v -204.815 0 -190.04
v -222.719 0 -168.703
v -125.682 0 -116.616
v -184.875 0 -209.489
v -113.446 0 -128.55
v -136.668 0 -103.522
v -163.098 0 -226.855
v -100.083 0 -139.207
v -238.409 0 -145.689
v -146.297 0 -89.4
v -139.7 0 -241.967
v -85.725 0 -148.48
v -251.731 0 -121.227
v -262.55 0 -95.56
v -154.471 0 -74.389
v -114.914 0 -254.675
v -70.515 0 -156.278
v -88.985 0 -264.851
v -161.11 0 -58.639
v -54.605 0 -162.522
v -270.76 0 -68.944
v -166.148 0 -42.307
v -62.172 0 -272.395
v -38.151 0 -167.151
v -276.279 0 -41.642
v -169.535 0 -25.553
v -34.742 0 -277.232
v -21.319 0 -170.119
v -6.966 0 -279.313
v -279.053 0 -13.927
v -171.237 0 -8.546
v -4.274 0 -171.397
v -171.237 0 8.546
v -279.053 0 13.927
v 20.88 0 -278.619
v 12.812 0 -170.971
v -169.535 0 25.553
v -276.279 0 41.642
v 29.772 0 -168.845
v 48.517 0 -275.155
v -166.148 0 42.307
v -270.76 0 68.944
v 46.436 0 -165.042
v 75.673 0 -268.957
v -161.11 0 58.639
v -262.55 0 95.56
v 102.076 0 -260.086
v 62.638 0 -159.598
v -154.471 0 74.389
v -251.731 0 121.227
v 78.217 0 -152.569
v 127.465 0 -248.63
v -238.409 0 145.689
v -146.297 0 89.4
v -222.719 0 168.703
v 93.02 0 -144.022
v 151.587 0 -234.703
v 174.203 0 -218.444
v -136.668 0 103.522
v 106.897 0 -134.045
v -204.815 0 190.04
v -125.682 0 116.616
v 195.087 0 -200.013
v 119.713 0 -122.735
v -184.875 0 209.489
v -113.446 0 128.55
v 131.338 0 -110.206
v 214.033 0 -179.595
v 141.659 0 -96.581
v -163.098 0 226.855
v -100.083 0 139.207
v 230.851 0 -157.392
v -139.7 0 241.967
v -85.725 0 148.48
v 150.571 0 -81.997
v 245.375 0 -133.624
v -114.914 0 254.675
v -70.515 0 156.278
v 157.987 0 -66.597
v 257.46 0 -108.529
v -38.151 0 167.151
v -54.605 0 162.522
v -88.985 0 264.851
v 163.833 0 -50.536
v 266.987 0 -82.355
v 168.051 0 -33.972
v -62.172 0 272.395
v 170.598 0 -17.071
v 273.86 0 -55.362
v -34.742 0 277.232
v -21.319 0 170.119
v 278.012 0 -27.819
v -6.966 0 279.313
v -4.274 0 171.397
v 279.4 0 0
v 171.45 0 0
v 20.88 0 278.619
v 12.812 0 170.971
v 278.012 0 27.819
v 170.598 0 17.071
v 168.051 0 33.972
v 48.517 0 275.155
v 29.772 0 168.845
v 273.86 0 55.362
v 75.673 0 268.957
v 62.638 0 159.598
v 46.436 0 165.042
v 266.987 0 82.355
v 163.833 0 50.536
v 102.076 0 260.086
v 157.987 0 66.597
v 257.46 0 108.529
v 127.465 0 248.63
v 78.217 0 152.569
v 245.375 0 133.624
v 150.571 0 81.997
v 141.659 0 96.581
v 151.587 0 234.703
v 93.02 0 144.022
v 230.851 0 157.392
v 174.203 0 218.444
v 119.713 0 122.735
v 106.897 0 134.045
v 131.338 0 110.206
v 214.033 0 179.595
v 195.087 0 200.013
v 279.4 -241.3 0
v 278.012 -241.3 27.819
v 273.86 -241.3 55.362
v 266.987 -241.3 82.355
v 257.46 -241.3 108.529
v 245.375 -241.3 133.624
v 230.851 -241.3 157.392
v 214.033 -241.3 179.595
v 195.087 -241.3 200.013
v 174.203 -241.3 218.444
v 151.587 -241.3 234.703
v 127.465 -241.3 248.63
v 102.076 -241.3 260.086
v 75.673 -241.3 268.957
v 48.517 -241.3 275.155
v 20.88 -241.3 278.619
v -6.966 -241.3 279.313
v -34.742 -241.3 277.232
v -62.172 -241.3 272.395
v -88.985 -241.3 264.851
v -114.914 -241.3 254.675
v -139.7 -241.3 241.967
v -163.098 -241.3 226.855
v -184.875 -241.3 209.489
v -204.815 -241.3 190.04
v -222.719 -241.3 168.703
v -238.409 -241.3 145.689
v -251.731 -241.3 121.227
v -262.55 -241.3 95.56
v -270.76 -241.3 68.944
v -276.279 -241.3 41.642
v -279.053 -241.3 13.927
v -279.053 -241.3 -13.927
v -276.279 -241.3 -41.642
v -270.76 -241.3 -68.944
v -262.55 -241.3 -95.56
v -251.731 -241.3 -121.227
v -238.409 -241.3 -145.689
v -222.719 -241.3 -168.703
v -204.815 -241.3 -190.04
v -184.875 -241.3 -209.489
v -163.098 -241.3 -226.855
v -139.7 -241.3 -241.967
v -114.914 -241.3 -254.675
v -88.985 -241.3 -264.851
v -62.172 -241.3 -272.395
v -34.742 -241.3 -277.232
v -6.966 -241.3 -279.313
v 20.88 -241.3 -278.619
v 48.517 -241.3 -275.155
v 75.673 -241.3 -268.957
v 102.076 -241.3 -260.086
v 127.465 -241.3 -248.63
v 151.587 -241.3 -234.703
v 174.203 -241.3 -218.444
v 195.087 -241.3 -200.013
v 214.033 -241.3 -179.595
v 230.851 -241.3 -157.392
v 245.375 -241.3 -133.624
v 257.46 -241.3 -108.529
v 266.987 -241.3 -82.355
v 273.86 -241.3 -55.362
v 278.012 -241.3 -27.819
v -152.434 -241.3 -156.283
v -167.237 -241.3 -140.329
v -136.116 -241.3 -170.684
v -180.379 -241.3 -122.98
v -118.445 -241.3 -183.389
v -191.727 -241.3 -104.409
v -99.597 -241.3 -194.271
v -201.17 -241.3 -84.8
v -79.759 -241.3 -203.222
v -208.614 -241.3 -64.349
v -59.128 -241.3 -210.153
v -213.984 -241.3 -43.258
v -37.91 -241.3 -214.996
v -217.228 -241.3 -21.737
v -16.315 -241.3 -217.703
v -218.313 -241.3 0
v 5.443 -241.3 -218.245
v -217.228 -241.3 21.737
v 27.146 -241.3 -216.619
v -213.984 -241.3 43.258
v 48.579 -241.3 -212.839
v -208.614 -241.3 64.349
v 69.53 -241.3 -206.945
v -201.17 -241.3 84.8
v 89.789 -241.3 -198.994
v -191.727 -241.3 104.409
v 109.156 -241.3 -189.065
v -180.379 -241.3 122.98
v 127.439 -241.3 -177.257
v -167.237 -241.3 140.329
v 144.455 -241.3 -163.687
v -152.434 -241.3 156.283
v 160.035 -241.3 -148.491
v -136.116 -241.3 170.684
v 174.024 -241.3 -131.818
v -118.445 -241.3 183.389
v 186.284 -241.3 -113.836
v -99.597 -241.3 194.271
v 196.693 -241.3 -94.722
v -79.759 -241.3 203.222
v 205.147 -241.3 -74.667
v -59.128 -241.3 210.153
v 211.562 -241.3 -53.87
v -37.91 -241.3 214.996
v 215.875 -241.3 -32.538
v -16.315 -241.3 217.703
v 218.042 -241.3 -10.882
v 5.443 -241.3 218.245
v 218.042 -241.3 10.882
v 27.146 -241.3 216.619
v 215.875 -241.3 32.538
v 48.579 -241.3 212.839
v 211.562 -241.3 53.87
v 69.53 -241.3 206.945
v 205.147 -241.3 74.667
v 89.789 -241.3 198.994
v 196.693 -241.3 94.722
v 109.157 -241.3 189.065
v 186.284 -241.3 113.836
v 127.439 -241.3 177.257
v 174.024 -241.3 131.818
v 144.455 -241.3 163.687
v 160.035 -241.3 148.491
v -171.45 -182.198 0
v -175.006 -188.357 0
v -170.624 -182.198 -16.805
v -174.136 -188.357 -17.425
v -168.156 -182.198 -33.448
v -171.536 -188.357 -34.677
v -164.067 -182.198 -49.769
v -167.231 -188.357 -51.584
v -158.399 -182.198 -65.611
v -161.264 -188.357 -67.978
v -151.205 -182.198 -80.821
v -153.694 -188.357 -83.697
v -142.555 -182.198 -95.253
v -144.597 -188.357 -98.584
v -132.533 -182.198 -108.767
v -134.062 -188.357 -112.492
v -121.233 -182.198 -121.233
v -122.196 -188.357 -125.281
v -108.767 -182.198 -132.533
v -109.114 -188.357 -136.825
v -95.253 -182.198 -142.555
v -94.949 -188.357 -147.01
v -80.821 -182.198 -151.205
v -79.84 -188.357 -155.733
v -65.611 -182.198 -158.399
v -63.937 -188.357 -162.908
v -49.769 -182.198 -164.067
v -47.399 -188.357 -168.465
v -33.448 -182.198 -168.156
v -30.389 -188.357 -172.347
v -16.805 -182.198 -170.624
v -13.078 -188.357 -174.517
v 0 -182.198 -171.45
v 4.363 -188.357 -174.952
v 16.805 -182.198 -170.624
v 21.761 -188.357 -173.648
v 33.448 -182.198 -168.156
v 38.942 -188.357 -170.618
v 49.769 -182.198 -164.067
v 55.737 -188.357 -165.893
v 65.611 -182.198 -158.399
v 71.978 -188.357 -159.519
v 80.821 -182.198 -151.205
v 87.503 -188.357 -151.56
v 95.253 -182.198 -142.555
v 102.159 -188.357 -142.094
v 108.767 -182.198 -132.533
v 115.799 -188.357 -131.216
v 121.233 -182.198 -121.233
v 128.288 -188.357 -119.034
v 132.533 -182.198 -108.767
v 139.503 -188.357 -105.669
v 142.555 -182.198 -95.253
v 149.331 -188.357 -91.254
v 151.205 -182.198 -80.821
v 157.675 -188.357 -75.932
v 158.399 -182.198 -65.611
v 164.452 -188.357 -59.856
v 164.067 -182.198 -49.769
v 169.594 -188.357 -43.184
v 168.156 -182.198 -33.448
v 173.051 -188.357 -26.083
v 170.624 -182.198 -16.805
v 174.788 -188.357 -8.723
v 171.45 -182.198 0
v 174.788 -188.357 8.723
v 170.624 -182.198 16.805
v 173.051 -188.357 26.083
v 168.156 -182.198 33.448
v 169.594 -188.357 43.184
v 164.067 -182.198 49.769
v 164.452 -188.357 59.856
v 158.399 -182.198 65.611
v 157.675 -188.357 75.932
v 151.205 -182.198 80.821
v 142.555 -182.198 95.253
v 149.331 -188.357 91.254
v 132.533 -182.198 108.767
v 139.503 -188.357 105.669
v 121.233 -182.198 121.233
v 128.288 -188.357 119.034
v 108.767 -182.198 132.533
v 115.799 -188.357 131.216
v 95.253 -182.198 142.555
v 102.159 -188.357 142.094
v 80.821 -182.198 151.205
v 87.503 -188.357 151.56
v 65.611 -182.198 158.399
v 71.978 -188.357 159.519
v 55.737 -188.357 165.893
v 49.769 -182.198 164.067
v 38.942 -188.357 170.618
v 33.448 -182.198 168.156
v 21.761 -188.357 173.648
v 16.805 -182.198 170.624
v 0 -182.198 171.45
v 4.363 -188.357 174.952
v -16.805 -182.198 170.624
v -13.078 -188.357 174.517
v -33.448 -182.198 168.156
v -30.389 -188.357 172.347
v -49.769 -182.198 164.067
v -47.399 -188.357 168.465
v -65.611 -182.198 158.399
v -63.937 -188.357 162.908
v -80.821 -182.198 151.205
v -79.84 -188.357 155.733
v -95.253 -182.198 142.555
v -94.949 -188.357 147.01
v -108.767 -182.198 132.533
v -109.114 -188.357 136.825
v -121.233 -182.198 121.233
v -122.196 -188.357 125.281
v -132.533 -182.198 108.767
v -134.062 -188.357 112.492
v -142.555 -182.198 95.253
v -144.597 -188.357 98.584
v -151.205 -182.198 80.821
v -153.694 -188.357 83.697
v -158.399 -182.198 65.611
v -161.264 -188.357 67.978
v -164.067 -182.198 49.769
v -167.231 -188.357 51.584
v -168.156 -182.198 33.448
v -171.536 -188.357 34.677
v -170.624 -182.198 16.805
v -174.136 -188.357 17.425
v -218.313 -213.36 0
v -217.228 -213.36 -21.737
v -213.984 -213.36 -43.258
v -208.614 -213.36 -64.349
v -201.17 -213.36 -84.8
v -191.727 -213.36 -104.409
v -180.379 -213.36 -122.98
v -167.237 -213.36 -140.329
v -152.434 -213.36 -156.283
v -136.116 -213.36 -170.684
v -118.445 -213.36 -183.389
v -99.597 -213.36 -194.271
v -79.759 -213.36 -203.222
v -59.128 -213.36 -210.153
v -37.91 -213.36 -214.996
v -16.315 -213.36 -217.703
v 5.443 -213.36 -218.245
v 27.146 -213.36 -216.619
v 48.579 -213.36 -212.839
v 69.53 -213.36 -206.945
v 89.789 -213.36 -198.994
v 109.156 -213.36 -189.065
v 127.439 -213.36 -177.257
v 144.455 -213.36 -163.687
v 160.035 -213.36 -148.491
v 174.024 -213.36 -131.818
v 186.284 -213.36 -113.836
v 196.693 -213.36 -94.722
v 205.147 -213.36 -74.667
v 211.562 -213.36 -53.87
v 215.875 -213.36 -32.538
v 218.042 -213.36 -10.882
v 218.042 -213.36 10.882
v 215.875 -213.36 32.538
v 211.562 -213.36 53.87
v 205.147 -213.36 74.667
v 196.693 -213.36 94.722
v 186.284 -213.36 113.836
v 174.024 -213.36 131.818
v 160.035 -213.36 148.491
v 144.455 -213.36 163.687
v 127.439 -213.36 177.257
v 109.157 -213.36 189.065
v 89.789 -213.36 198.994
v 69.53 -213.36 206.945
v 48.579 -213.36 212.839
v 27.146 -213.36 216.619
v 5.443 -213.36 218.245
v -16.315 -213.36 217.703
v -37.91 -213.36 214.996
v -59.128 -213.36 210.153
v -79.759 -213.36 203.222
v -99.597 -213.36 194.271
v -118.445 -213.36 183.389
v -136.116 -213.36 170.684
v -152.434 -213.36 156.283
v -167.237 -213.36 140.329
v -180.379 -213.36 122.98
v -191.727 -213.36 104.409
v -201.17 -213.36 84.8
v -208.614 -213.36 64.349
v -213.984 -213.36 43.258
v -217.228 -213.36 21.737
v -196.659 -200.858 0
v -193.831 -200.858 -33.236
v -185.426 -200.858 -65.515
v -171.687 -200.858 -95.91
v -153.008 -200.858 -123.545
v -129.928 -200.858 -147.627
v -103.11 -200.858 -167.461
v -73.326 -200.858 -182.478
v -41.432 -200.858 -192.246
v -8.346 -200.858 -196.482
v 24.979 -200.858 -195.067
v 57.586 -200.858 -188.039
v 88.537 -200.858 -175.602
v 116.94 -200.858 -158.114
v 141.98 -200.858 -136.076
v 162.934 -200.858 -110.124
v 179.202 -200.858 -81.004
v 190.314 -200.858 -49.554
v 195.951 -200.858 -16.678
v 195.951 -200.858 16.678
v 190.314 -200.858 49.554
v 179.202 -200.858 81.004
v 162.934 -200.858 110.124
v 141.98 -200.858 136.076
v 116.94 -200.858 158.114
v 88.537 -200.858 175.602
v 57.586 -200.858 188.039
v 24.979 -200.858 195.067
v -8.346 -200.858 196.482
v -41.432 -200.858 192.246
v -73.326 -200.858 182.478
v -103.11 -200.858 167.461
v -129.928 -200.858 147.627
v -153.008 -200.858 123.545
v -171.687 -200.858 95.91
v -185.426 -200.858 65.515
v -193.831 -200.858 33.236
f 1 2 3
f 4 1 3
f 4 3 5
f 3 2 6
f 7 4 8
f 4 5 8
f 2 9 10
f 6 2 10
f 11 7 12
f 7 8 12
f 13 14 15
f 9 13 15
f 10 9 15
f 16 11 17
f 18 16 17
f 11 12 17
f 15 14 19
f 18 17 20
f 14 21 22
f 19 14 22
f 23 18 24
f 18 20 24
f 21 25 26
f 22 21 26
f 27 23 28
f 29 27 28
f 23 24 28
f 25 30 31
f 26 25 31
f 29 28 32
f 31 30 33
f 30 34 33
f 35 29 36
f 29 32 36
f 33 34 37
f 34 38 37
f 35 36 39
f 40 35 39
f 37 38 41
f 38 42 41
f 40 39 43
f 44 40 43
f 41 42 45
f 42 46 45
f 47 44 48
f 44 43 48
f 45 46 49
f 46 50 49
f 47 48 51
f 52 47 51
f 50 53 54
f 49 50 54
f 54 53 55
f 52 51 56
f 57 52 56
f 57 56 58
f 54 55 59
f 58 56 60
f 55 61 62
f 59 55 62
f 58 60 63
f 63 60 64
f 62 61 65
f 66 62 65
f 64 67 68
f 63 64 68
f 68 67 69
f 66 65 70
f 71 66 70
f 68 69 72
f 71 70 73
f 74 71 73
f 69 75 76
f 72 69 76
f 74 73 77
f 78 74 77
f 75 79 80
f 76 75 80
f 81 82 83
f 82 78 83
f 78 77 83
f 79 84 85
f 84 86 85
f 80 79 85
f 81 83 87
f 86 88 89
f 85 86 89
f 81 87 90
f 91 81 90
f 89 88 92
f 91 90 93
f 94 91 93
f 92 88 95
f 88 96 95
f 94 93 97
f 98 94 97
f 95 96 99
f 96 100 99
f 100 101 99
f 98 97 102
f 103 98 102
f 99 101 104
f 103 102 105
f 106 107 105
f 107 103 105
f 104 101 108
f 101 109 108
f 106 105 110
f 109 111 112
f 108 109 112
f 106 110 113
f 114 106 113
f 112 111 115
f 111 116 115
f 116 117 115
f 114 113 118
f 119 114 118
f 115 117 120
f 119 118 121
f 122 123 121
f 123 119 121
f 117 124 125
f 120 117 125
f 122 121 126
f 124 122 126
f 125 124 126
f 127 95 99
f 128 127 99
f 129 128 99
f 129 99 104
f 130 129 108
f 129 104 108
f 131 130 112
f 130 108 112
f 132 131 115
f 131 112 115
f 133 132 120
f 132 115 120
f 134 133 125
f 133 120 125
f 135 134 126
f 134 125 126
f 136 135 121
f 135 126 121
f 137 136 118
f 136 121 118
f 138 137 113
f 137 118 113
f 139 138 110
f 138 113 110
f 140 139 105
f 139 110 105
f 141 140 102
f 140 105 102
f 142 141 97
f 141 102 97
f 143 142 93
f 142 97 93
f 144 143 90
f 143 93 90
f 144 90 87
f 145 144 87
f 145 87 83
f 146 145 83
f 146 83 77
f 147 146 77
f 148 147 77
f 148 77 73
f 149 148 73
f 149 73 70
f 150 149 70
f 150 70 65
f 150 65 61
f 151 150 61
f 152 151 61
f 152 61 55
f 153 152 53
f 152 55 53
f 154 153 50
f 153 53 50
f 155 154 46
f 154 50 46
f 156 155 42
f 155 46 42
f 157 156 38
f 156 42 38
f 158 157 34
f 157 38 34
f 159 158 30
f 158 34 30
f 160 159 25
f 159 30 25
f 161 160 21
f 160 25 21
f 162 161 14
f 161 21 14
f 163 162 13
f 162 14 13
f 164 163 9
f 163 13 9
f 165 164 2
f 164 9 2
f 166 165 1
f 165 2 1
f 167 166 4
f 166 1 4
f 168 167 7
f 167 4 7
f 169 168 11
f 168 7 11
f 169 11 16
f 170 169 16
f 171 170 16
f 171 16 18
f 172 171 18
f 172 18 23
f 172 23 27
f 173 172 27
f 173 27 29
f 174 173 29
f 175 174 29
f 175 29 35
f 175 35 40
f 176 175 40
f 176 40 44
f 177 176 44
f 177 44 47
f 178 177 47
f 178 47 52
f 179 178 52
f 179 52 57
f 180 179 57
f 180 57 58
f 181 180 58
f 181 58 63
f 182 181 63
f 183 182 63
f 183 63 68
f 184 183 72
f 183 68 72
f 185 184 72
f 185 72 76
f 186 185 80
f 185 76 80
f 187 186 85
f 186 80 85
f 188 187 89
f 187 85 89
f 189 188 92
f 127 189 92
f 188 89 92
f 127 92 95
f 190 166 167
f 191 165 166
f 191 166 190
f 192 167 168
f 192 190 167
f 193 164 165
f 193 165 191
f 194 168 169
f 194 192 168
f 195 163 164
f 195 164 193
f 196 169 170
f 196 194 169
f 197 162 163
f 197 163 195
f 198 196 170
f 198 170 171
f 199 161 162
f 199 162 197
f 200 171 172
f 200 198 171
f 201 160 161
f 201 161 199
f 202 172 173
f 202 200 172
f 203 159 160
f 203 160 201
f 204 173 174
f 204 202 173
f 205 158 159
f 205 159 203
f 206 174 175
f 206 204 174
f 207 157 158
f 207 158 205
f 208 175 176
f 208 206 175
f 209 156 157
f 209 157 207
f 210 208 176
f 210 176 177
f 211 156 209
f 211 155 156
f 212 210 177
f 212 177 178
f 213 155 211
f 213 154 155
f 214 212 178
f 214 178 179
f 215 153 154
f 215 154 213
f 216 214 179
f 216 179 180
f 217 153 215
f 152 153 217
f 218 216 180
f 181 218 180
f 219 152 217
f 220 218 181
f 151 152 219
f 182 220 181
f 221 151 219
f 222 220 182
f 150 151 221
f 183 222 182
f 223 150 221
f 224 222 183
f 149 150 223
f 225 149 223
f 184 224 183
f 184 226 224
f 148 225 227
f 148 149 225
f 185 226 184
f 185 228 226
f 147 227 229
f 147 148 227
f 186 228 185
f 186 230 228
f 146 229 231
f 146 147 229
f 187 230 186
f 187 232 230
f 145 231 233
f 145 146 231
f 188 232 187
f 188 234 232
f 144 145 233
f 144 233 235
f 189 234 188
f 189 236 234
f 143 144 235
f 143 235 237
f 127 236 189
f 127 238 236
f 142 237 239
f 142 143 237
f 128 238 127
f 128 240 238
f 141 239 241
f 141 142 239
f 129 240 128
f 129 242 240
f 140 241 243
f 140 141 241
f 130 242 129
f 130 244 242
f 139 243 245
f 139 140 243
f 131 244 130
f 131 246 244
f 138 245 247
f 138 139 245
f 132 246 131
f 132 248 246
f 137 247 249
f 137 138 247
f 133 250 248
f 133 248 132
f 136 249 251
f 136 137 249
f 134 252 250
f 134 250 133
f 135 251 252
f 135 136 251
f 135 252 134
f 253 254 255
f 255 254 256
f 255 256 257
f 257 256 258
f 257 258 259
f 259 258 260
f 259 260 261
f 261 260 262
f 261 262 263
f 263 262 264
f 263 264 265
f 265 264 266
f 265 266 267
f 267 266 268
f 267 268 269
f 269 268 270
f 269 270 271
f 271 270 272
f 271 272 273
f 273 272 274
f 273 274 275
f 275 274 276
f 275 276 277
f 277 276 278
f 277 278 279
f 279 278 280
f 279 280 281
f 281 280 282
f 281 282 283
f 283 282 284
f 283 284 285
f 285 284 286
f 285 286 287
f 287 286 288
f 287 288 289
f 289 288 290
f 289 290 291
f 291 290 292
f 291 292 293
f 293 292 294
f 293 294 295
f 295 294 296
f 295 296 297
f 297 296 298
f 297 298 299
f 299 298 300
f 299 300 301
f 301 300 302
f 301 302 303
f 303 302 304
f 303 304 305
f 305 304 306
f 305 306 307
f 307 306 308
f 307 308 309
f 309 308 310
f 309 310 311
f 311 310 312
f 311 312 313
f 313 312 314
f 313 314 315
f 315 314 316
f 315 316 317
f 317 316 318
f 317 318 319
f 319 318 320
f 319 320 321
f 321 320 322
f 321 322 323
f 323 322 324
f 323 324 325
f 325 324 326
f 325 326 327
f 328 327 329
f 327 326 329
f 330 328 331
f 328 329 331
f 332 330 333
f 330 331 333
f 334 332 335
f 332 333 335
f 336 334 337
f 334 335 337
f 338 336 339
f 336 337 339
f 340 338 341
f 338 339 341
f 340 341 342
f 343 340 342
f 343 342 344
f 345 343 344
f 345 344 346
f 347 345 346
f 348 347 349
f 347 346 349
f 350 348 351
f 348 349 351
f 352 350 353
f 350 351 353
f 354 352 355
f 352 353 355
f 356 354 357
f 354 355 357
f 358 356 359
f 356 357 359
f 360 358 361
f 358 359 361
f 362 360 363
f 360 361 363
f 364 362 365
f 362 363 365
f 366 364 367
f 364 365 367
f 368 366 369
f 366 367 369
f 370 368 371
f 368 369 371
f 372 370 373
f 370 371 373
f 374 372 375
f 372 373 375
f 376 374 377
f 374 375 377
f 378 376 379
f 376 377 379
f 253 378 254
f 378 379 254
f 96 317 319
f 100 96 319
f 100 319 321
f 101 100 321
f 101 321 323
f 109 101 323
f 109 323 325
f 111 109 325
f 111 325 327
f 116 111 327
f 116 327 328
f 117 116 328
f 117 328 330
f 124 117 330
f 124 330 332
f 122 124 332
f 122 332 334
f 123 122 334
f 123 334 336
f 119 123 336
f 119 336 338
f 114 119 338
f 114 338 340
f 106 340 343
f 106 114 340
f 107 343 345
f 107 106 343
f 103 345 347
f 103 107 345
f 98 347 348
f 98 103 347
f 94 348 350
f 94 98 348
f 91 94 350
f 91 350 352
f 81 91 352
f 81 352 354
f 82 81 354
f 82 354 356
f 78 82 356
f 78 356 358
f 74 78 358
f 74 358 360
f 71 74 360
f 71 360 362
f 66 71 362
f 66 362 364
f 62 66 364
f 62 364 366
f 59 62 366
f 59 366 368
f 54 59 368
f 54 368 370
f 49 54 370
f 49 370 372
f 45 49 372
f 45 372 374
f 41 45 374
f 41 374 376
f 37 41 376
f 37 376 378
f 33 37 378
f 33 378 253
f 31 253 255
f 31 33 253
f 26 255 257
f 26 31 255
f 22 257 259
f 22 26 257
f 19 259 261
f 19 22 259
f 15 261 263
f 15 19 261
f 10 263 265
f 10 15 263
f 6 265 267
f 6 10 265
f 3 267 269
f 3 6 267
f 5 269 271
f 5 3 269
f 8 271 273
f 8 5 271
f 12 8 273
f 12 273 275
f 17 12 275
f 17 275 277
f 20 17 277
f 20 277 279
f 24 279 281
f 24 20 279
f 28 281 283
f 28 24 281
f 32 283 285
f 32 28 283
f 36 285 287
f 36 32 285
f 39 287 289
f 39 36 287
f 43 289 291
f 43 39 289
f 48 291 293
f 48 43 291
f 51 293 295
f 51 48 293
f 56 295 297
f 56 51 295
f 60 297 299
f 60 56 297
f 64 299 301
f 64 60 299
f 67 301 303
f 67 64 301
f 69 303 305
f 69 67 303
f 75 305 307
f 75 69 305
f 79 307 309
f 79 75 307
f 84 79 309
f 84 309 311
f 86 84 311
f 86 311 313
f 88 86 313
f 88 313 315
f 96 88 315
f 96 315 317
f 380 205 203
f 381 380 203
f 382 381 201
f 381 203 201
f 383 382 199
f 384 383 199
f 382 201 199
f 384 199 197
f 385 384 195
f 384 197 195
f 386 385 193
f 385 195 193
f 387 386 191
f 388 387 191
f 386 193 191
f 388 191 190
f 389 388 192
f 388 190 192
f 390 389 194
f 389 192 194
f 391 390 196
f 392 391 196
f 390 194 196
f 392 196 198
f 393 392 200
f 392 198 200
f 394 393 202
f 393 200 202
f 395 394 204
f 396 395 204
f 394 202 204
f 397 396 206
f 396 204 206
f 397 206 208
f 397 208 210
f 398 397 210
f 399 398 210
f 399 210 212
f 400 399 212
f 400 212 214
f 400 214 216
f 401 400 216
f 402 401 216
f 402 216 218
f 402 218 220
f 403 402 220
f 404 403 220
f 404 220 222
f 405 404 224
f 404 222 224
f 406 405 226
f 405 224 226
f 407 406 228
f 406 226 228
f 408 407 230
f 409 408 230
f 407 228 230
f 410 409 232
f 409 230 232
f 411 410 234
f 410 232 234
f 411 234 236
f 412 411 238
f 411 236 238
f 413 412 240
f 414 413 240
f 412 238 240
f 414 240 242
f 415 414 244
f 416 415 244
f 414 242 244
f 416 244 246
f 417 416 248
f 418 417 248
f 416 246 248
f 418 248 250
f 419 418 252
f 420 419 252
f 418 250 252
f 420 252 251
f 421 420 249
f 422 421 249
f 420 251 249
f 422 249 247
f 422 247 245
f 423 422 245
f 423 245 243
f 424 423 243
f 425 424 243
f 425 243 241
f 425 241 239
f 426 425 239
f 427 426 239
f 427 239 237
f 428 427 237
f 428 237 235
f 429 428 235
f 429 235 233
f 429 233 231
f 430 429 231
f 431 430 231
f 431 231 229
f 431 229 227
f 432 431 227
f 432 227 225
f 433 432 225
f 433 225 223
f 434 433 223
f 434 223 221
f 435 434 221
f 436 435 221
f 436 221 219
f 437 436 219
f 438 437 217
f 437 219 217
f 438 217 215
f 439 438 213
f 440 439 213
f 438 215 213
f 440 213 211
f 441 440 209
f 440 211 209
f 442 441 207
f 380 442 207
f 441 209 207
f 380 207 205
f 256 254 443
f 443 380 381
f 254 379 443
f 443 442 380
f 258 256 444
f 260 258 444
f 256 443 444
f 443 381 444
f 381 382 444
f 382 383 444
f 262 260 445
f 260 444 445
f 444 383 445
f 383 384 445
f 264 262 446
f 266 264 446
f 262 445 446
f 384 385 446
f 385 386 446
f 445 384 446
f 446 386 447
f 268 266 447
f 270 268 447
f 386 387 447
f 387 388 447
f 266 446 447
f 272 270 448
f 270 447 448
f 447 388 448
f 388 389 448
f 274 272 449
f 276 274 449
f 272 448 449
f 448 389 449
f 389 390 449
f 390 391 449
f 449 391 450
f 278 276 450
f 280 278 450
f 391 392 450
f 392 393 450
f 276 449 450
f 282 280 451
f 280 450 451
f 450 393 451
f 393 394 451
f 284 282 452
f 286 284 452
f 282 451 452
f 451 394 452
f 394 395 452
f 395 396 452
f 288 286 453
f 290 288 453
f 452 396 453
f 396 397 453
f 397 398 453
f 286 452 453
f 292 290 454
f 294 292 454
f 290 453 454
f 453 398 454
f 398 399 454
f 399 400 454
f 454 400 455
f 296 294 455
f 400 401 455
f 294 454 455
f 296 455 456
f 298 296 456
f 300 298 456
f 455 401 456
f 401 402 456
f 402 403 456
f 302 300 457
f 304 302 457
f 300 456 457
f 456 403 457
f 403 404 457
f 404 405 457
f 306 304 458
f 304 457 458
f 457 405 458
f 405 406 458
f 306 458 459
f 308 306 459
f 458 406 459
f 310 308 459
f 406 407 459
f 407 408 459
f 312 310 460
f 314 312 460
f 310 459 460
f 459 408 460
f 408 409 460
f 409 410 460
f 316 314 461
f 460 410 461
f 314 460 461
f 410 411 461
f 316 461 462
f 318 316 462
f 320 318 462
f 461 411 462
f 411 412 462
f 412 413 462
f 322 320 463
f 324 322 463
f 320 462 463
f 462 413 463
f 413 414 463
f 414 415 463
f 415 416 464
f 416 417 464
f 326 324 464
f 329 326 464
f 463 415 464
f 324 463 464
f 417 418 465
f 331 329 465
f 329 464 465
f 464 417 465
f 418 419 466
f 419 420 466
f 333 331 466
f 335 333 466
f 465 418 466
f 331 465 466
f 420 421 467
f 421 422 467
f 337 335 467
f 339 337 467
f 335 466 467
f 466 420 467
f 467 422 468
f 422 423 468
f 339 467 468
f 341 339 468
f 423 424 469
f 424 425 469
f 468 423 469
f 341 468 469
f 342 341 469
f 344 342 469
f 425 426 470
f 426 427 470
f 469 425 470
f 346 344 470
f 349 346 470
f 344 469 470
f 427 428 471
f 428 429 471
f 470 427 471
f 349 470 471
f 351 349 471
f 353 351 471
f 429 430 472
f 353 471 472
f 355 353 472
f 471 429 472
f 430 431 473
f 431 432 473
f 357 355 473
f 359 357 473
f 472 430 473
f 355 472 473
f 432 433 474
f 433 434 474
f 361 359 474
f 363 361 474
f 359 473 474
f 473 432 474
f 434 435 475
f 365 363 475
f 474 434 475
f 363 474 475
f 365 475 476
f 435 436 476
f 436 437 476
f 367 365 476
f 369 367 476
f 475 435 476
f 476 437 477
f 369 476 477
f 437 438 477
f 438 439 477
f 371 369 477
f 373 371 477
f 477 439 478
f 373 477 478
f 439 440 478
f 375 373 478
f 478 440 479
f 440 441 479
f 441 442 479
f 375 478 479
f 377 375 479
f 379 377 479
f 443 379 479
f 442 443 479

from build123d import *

# Parameters (mm, degrees)
F0_R     = 279.4
F0_R_2   = 171.45
F1_DEPTH = 241.3


with BuildPart() as f1:
    # F0 (on Front) → F1 (new body)
    with BuildSketch(Plane.XZ):
        Circle(F0_R)
        Circle(F0_R_2, mode=Mode.SUBTRACT)
    extrude(amount=F1_DEPTH)

    # F2 (on Top) → F3 (revolve, cut)
    with BuildSketch(Plane.XY):
        Polygon((-218.313, -213.36), (-218.313, -248.940435), (-138.143639, -248.940435), (-150.698322, -174.322647), (-162.82623, -167.260711), (-175.006, -188.356692), align=None)
    revolve(axis=Axis((0, -122.0978, 0), (0, -1, 0)), mode=Mode.SUBTRACT)


solid = f1.part
